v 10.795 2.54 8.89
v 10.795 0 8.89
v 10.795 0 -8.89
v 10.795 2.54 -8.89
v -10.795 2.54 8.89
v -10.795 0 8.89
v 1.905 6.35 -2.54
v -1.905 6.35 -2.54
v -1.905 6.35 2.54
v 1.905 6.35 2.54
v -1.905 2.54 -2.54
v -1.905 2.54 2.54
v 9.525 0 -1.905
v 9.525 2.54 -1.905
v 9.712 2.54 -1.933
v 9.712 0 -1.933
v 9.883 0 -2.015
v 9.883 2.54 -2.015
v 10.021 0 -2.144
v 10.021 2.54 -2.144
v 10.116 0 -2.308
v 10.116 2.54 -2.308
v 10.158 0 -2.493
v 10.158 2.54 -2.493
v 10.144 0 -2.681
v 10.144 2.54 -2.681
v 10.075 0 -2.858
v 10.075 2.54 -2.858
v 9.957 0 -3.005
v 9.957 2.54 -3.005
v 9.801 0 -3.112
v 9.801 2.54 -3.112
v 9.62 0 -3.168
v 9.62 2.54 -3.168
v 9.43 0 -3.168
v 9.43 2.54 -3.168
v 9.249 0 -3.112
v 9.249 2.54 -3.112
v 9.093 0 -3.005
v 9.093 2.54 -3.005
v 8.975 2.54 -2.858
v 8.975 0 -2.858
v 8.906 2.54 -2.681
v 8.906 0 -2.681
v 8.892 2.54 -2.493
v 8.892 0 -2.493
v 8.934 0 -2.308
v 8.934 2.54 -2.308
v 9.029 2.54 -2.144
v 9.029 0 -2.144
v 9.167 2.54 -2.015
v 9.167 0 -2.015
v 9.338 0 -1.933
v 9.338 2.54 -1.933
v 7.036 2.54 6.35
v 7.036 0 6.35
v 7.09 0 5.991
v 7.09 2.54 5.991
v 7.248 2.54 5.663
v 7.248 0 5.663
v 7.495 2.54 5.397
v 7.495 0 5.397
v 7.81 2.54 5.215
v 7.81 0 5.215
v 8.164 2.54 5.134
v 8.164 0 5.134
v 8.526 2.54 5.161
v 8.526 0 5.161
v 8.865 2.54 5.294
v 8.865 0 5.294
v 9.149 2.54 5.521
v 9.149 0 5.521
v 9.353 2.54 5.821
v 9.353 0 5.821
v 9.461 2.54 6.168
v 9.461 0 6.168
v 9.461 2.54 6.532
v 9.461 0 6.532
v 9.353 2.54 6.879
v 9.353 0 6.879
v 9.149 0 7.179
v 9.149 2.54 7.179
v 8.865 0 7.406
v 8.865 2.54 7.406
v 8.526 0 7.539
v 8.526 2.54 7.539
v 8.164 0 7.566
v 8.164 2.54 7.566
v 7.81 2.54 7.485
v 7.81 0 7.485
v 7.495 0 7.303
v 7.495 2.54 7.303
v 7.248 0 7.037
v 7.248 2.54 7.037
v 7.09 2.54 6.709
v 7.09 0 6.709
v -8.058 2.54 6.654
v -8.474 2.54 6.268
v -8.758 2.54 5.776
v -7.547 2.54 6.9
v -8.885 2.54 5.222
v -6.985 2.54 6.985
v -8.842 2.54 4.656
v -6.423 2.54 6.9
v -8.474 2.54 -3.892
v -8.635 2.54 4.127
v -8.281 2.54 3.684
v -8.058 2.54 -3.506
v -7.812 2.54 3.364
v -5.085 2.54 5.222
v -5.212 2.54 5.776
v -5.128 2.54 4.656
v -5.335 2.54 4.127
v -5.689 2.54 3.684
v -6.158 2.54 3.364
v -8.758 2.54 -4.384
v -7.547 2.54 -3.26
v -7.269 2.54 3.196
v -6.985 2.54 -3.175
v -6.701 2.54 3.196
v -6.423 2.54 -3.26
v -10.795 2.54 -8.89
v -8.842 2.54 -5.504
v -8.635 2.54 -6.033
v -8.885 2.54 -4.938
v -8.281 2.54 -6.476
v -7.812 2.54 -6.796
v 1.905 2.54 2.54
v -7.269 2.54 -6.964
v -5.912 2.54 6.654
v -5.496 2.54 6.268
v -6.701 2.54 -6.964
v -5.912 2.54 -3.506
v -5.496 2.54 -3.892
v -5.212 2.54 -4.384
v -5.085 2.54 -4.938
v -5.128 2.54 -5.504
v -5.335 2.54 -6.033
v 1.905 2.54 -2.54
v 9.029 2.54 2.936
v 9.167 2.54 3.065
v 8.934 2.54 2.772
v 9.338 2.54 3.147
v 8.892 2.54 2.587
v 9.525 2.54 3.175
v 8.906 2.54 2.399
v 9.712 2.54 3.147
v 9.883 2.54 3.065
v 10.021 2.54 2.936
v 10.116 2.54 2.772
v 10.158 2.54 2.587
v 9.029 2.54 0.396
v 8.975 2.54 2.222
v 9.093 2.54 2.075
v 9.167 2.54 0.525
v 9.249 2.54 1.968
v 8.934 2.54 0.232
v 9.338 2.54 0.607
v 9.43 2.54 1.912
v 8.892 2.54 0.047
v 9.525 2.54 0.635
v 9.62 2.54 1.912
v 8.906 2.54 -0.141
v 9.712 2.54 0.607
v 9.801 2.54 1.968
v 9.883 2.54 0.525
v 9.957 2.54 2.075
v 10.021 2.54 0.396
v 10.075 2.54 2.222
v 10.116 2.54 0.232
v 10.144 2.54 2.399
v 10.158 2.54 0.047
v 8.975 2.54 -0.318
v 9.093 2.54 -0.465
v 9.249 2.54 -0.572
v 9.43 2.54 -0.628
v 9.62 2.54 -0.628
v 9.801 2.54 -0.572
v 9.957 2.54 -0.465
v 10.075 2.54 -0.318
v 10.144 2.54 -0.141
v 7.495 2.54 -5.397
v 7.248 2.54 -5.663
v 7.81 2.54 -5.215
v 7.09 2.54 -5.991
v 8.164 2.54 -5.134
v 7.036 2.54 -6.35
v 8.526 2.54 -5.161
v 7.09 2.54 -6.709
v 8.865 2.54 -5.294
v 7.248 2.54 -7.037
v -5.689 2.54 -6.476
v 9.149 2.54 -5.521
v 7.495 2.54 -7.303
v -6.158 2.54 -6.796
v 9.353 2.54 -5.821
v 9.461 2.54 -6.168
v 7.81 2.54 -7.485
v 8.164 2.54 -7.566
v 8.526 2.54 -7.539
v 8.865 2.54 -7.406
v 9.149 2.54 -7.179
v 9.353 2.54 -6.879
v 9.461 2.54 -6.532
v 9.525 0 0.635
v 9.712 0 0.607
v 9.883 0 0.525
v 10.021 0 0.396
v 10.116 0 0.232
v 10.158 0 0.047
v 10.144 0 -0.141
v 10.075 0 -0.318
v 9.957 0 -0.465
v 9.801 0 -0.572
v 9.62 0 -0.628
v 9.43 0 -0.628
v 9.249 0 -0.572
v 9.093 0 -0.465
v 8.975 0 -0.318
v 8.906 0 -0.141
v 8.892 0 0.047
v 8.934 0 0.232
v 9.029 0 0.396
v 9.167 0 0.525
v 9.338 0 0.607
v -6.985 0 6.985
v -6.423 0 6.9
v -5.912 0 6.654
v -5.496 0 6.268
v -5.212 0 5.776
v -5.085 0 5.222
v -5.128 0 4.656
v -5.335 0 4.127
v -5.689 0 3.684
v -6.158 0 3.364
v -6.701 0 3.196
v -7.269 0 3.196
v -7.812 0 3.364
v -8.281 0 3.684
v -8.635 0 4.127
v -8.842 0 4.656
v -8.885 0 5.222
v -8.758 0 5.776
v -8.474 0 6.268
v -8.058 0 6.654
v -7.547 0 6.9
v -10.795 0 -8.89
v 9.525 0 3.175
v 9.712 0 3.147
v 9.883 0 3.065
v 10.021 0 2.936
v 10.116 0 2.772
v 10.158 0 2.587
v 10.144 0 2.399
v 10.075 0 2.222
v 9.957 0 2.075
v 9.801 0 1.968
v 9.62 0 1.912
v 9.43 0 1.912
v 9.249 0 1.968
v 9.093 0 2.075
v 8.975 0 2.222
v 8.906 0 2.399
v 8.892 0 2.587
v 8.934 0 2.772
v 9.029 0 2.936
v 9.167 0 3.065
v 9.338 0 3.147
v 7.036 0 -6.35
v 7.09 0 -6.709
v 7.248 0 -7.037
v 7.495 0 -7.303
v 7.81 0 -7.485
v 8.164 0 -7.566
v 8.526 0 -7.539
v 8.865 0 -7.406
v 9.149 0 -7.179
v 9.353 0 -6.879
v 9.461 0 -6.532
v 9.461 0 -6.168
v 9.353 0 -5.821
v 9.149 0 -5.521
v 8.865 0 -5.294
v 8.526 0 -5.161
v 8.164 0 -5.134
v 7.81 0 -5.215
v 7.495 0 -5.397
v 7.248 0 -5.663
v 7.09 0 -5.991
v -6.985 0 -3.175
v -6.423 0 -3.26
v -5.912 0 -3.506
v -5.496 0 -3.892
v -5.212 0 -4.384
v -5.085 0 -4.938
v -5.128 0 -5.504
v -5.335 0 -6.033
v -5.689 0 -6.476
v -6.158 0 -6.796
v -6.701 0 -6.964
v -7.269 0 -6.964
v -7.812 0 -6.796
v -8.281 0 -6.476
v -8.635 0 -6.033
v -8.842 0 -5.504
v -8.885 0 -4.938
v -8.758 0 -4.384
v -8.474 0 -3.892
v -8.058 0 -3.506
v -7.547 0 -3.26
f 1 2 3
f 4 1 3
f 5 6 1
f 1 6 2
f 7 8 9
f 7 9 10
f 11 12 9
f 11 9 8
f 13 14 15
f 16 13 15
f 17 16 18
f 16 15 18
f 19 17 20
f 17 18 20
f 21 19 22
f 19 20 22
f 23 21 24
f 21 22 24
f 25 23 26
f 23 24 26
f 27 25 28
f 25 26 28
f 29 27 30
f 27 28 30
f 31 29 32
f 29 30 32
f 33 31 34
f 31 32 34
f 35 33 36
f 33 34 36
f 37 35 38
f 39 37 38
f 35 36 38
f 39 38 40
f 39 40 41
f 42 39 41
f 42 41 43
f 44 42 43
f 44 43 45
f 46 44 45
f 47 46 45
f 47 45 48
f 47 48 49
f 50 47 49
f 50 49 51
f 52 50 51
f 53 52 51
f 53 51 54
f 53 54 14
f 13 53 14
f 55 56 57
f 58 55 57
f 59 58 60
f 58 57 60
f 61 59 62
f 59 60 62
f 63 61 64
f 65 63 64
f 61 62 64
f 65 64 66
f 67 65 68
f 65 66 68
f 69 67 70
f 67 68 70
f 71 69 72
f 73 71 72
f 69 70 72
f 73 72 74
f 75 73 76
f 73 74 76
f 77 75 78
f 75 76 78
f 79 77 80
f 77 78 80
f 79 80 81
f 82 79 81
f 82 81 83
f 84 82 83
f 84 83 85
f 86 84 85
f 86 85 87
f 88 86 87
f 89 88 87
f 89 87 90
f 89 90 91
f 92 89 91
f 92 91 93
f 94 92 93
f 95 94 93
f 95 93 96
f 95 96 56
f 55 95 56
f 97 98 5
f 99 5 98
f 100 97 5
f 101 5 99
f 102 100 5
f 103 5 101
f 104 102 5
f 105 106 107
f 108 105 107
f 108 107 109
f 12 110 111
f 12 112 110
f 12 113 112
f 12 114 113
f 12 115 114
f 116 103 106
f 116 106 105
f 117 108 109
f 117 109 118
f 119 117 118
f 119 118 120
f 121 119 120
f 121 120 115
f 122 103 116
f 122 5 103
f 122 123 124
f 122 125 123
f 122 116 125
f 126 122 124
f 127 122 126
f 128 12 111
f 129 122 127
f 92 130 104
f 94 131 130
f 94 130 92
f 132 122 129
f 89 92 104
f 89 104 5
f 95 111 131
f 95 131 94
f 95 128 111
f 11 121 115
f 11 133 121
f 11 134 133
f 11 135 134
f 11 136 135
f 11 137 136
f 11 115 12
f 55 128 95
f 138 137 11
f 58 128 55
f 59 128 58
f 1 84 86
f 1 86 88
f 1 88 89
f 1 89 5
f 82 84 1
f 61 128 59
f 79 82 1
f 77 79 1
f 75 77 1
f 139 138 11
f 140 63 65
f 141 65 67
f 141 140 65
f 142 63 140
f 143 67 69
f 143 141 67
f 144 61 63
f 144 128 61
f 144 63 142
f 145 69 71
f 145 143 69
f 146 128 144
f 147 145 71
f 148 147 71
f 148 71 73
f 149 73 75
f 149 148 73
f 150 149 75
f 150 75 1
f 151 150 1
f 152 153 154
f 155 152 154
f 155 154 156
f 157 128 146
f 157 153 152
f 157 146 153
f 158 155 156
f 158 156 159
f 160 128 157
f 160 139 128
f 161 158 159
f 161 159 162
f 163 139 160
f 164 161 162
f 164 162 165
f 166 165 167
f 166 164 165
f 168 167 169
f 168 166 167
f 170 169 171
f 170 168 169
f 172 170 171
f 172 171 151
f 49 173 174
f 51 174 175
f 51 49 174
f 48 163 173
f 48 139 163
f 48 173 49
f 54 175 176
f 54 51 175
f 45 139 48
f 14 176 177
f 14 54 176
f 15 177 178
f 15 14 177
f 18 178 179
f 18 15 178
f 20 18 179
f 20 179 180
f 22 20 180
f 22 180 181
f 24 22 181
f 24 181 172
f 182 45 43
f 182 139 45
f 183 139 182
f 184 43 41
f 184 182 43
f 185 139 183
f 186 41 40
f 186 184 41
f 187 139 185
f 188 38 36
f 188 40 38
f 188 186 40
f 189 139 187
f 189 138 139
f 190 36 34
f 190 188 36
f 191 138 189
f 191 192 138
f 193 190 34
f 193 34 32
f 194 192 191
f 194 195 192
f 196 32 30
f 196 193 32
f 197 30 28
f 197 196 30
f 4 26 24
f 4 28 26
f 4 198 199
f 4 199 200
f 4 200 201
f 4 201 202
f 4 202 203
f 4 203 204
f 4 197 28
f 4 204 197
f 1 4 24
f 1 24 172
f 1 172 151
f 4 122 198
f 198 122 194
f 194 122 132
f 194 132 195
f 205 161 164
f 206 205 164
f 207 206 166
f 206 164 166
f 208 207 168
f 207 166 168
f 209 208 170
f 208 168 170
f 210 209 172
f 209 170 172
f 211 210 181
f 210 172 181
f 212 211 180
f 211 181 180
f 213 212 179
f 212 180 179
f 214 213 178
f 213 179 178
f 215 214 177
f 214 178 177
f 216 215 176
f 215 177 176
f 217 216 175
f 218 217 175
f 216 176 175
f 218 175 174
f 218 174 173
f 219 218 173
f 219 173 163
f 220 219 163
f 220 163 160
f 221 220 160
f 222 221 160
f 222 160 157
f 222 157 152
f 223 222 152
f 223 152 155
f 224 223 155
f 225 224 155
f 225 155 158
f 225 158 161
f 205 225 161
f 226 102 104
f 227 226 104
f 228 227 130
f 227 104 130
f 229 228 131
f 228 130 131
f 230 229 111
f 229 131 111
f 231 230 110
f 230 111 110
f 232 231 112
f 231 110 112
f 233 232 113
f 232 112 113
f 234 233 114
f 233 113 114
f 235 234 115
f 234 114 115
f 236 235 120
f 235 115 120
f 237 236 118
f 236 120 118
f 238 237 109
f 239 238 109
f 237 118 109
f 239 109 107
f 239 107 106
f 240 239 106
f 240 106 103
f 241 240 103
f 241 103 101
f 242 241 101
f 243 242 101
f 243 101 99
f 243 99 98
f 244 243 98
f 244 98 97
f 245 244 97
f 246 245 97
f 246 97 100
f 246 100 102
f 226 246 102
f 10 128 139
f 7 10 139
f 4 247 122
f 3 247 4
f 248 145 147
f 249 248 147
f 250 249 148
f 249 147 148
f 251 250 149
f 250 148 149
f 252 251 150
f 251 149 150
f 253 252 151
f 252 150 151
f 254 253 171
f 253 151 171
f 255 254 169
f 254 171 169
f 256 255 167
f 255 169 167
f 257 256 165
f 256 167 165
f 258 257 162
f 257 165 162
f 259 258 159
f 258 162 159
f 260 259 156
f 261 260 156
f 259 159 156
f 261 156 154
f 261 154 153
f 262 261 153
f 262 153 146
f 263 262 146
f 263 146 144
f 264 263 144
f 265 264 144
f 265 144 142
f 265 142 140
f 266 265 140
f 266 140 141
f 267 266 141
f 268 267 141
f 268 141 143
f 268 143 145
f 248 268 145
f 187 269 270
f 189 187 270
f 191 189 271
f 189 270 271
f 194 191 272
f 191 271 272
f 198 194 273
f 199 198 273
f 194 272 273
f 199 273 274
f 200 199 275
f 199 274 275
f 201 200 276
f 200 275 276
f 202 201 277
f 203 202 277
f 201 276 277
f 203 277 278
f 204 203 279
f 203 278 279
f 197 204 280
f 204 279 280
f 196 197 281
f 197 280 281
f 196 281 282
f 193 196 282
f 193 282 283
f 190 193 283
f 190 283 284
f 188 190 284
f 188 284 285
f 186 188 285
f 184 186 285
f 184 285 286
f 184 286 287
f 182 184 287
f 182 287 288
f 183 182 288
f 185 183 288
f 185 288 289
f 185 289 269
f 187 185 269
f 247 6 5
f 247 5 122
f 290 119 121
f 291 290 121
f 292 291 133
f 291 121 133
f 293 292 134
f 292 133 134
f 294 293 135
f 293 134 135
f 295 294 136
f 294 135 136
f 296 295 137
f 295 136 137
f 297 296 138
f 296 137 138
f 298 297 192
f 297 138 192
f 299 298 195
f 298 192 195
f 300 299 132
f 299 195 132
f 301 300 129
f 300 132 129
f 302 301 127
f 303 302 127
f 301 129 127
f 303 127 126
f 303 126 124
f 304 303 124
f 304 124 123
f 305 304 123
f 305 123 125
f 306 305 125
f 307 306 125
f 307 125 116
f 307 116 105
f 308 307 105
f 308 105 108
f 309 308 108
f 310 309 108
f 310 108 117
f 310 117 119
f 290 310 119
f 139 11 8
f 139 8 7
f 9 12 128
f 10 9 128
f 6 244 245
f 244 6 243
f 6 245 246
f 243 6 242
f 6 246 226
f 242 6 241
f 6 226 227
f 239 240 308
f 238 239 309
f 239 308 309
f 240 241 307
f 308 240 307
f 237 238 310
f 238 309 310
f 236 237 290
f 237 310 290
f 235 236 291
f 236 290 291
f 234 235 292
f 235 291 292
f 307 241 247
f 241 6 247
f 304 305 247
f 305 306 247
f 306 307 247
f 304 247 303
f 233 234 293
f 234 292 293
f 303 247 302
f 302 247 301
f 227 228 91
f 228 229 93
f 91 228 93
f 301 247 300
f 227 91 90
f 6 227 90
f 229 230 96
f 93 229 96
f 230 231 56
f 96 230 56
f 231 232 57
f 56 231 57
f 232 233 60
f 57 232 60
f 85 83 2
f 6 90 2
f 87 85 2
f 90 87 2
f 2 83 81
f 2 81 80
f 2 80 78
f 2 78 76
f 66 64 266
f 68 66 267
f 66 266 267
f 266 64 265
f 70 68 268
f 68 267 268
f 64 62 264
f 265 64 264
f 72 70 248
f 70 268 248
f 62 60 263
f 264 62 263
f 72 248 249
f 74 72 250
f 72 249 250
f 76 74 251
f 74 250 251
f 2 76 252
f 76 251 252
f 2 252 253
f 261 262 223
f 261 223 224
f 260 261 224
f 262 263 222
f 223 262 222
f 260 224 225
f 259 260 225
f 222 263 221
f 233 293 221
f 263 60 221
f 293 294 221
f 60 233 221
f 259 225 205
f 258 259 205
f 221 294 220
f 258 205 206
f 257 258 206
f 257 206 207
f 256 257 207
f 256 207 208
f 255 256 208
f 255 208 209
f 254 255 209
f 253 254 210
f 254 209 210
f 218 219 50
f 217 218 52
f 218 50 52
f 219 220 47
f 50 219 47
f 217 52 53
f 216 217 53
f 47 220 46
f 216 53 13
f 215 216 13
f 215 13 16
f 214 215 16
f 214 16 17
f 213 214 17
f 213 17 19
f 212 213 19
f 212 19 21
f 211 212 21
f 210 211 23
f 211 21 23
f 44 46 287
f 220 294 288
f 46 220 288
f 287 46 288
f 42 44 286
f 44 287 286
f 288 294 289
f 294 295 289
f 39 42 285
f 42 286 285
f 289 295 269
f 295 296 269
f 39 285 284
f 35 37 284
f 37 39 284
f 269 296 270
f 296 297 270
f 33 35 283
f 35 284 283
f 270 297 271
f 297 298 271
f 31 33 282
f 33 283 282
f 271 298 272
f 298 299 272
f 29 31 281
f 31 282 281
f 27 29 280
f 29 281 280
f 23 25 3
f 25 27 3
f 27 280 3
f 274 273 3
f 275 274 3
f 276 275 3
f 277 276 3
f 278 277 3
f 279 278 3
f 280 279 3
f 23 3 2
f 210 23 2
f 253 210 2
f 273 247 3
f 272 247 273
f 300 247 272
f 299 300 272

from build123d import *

# Parameters (mm, degrees)
SKETCH1_W                 = 21.59
SKETCH1_H                 = 17.78
BOSS_EXTRUDE1_DEPTH       = 2.54
SKETCH2_R                 = 1.905
SKETCH2_R_2               = 0.635
CUT_EXTRUDE1_DEPTH        = 15.213223596
SKETCH3_W                 = 3.81
SKETCH3_H                 = 5.08
BOSS_EXTRUDE2_DEPTH       = 3.81
F_2_CLEARANCE_HOLE1_D     = 2.4384
F_2_CLEARANCE_HOLE1_DEPTH = 6.35
F_2_CLEARANCE_HOLE1_TIP   = 0.732569267


with BuildPart() as part:
    # Sketch1 → Boss-Extrude1 (new body)
    with BuildSketch(Plane(origin=(0, 0, 0), x_dir=(1, 0, 0), z_dir=(0, 1, 0))):
        Rectangle(SKETCH1_W, SKETCH1_H)
    extrude(amount=BOSS_EXTRUDE1_DEPTH)

    # Sketch2 → Cut-Extrude1 (cut, through all)
    with BuildSketch(Plane(origin=(0, 2.54, 0), x_dir=(1, 0, 0), z_dir=(0, 1, 0))):
        with Locations(Location((-6.985, 5.08, 0), (0, 0, 270))):
            Circle(SKETCH2_R)
        with Locations(Location((-6.985, -5.08, 0), (0, 0, 270))):
            Circle(SKETCH2_R)
        with Locations(Location((9.525, 2.54, 0), (0, 0, 270))):
            Circle(SKETCH2_R_2)
        with Locations(Location((9.525, 0, 0), (0, 0, 270))):
            Circle(SKETCH2_R_2)
        with Locations(Location((9.525, -2.54, 0), (0, 0, 270))):
            Circle(SKETCH2_R_2)
    extrude(amount=-CUT_EXTRUDE1_DEPTH, mode=Mode.SUBTRACT)

    # Sketch3 → Boss-Extrude2 (add)
    with BuildSketch(Plane(origin=(0, 2.54, 0), x_dir=(1, 0, 0), z_dir=(0, 1, 0))):
        Rectangle(SKETCH3_W, SKETCH3_H)
    extrude(amount=BOSS_EXTRUDE2_DEPTH)

    # #2 Clearance Hole1
    with Locations(Plane(origin=(0, 2.54, 0), x_dir=(1, 0, 0), z_dir=(0, 1, 0))):
        with Locations((8.255, 6.35), (8.255, -6.35)):
            Hole(F_2_CLEARANCE_HOLE1_D / 2, depth=F_2_CLEARANCE_HOLE1_DEPTH)
            with Locations((0, 0, -(F_2_CLEARANCE_HOLE1_DEPTH + F_2_CLEARANCE_HOLE1_TIP / 2))):  # 118° drill point
                Cone(0, F_2_CLEARANCE_HOLE1_D / 2, F_2_CLEARANCE_HOLE1_TIP, mode=Mode.SUBTRACT)


solid = part.part
